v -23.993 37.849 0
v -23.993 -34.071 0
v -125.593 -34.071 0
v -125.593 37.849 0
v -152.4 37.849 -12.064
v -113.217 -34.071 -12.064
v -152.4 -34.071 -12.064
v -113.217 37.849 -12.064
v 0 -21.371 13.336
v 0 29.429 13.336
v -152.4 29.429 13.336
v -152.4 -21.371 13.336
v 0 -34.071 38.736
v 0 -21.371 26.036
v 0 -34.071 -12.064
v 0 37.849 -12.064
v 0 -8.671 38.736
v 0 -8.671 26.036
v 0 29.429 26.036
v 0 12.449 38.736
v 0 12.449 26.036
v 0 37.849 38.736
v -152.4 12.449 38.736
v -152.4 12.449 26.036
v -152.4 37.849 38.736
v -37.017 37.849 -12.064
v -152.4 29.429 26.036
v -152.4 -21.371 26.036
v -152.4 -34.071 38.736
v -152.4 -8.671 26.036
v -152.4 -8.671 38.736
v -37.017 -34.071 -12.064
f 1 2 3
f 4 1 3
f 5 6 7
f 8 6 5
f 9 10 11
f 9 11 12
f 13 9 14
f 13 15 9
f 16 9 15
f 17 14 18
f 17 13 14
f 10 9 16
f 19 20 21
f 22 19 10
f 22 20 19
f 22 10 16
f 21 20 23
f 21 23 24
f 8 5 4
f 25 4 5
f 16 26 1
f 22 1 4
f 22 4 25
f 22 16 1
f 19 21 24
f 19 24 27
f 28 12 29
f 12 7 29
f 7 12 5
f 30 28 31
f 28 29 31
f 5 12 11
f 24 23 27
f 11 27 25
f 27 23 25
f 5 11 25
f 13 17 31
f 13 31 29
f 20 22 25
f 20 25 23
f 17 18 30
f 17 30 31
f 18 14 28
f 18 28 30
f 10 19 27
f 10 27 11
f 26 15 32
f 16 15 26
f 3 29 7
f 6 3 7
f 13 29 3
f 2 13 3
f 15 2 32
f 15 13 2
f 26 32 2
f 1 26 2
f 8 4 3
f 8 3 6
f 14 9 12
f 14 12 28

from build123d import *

# Parameters (mm, degrees)
F1_DEPTH = 152.4
F2_DEPTH = 152.4
F4_DEPTH = 76.2


with BuildPart() as f1:
    # F0 (on Right) → F1 (new body)
    with BuildSketch(Plane.YZ):
        Polygon((-8.67072, 38.735581), (-34.07072, 38.735581), (-34.07072, -12.064419), (37.848741, -12.064419), (37.848741, 38.735581), (12.448741, 38.735581), (12.448741, 26.035581), (29.42928, 26.035581), (29.42928, 13.335581), (-21.37072, 13.335581), (-21.37072, 26.035581), (-8.67072, 26.035581), align=None)
    extrude(amount=-F1_DEPTH)

    # F0 (on Right) → F2 (join)
    with BuildSketch(Plane.YZ):
        Polygon((-8.67072, 38.735581), (-34.07072, 38.735581), (-34.07072, -12.064419), (37.848741, -12.064419), (37.848741, 38.735581), (12.448741, 38.735581), (12.448741, 26.035581), (29.42928, 26.035581), (29.42928, 13.335581), (-21.37072, 13.335581), (-21.37072, 26.035581), (-8.67072, 26.035581), align=None)
    extrude(amount=-F2_DEPTH)

    # F3 (on face) → F4 (cut)
    with BuildSketch(Plane.XZ.offset(34.07072)):
        Polygon((-125.592947, 0), (-113.217302, -12.064419), (-37.017302, -12.064419), (-23.992947, 0), align=None)
    extrude(amount=-F4_DEPTH, mode=Mode.SUBTRACT)


solid = f1.part
